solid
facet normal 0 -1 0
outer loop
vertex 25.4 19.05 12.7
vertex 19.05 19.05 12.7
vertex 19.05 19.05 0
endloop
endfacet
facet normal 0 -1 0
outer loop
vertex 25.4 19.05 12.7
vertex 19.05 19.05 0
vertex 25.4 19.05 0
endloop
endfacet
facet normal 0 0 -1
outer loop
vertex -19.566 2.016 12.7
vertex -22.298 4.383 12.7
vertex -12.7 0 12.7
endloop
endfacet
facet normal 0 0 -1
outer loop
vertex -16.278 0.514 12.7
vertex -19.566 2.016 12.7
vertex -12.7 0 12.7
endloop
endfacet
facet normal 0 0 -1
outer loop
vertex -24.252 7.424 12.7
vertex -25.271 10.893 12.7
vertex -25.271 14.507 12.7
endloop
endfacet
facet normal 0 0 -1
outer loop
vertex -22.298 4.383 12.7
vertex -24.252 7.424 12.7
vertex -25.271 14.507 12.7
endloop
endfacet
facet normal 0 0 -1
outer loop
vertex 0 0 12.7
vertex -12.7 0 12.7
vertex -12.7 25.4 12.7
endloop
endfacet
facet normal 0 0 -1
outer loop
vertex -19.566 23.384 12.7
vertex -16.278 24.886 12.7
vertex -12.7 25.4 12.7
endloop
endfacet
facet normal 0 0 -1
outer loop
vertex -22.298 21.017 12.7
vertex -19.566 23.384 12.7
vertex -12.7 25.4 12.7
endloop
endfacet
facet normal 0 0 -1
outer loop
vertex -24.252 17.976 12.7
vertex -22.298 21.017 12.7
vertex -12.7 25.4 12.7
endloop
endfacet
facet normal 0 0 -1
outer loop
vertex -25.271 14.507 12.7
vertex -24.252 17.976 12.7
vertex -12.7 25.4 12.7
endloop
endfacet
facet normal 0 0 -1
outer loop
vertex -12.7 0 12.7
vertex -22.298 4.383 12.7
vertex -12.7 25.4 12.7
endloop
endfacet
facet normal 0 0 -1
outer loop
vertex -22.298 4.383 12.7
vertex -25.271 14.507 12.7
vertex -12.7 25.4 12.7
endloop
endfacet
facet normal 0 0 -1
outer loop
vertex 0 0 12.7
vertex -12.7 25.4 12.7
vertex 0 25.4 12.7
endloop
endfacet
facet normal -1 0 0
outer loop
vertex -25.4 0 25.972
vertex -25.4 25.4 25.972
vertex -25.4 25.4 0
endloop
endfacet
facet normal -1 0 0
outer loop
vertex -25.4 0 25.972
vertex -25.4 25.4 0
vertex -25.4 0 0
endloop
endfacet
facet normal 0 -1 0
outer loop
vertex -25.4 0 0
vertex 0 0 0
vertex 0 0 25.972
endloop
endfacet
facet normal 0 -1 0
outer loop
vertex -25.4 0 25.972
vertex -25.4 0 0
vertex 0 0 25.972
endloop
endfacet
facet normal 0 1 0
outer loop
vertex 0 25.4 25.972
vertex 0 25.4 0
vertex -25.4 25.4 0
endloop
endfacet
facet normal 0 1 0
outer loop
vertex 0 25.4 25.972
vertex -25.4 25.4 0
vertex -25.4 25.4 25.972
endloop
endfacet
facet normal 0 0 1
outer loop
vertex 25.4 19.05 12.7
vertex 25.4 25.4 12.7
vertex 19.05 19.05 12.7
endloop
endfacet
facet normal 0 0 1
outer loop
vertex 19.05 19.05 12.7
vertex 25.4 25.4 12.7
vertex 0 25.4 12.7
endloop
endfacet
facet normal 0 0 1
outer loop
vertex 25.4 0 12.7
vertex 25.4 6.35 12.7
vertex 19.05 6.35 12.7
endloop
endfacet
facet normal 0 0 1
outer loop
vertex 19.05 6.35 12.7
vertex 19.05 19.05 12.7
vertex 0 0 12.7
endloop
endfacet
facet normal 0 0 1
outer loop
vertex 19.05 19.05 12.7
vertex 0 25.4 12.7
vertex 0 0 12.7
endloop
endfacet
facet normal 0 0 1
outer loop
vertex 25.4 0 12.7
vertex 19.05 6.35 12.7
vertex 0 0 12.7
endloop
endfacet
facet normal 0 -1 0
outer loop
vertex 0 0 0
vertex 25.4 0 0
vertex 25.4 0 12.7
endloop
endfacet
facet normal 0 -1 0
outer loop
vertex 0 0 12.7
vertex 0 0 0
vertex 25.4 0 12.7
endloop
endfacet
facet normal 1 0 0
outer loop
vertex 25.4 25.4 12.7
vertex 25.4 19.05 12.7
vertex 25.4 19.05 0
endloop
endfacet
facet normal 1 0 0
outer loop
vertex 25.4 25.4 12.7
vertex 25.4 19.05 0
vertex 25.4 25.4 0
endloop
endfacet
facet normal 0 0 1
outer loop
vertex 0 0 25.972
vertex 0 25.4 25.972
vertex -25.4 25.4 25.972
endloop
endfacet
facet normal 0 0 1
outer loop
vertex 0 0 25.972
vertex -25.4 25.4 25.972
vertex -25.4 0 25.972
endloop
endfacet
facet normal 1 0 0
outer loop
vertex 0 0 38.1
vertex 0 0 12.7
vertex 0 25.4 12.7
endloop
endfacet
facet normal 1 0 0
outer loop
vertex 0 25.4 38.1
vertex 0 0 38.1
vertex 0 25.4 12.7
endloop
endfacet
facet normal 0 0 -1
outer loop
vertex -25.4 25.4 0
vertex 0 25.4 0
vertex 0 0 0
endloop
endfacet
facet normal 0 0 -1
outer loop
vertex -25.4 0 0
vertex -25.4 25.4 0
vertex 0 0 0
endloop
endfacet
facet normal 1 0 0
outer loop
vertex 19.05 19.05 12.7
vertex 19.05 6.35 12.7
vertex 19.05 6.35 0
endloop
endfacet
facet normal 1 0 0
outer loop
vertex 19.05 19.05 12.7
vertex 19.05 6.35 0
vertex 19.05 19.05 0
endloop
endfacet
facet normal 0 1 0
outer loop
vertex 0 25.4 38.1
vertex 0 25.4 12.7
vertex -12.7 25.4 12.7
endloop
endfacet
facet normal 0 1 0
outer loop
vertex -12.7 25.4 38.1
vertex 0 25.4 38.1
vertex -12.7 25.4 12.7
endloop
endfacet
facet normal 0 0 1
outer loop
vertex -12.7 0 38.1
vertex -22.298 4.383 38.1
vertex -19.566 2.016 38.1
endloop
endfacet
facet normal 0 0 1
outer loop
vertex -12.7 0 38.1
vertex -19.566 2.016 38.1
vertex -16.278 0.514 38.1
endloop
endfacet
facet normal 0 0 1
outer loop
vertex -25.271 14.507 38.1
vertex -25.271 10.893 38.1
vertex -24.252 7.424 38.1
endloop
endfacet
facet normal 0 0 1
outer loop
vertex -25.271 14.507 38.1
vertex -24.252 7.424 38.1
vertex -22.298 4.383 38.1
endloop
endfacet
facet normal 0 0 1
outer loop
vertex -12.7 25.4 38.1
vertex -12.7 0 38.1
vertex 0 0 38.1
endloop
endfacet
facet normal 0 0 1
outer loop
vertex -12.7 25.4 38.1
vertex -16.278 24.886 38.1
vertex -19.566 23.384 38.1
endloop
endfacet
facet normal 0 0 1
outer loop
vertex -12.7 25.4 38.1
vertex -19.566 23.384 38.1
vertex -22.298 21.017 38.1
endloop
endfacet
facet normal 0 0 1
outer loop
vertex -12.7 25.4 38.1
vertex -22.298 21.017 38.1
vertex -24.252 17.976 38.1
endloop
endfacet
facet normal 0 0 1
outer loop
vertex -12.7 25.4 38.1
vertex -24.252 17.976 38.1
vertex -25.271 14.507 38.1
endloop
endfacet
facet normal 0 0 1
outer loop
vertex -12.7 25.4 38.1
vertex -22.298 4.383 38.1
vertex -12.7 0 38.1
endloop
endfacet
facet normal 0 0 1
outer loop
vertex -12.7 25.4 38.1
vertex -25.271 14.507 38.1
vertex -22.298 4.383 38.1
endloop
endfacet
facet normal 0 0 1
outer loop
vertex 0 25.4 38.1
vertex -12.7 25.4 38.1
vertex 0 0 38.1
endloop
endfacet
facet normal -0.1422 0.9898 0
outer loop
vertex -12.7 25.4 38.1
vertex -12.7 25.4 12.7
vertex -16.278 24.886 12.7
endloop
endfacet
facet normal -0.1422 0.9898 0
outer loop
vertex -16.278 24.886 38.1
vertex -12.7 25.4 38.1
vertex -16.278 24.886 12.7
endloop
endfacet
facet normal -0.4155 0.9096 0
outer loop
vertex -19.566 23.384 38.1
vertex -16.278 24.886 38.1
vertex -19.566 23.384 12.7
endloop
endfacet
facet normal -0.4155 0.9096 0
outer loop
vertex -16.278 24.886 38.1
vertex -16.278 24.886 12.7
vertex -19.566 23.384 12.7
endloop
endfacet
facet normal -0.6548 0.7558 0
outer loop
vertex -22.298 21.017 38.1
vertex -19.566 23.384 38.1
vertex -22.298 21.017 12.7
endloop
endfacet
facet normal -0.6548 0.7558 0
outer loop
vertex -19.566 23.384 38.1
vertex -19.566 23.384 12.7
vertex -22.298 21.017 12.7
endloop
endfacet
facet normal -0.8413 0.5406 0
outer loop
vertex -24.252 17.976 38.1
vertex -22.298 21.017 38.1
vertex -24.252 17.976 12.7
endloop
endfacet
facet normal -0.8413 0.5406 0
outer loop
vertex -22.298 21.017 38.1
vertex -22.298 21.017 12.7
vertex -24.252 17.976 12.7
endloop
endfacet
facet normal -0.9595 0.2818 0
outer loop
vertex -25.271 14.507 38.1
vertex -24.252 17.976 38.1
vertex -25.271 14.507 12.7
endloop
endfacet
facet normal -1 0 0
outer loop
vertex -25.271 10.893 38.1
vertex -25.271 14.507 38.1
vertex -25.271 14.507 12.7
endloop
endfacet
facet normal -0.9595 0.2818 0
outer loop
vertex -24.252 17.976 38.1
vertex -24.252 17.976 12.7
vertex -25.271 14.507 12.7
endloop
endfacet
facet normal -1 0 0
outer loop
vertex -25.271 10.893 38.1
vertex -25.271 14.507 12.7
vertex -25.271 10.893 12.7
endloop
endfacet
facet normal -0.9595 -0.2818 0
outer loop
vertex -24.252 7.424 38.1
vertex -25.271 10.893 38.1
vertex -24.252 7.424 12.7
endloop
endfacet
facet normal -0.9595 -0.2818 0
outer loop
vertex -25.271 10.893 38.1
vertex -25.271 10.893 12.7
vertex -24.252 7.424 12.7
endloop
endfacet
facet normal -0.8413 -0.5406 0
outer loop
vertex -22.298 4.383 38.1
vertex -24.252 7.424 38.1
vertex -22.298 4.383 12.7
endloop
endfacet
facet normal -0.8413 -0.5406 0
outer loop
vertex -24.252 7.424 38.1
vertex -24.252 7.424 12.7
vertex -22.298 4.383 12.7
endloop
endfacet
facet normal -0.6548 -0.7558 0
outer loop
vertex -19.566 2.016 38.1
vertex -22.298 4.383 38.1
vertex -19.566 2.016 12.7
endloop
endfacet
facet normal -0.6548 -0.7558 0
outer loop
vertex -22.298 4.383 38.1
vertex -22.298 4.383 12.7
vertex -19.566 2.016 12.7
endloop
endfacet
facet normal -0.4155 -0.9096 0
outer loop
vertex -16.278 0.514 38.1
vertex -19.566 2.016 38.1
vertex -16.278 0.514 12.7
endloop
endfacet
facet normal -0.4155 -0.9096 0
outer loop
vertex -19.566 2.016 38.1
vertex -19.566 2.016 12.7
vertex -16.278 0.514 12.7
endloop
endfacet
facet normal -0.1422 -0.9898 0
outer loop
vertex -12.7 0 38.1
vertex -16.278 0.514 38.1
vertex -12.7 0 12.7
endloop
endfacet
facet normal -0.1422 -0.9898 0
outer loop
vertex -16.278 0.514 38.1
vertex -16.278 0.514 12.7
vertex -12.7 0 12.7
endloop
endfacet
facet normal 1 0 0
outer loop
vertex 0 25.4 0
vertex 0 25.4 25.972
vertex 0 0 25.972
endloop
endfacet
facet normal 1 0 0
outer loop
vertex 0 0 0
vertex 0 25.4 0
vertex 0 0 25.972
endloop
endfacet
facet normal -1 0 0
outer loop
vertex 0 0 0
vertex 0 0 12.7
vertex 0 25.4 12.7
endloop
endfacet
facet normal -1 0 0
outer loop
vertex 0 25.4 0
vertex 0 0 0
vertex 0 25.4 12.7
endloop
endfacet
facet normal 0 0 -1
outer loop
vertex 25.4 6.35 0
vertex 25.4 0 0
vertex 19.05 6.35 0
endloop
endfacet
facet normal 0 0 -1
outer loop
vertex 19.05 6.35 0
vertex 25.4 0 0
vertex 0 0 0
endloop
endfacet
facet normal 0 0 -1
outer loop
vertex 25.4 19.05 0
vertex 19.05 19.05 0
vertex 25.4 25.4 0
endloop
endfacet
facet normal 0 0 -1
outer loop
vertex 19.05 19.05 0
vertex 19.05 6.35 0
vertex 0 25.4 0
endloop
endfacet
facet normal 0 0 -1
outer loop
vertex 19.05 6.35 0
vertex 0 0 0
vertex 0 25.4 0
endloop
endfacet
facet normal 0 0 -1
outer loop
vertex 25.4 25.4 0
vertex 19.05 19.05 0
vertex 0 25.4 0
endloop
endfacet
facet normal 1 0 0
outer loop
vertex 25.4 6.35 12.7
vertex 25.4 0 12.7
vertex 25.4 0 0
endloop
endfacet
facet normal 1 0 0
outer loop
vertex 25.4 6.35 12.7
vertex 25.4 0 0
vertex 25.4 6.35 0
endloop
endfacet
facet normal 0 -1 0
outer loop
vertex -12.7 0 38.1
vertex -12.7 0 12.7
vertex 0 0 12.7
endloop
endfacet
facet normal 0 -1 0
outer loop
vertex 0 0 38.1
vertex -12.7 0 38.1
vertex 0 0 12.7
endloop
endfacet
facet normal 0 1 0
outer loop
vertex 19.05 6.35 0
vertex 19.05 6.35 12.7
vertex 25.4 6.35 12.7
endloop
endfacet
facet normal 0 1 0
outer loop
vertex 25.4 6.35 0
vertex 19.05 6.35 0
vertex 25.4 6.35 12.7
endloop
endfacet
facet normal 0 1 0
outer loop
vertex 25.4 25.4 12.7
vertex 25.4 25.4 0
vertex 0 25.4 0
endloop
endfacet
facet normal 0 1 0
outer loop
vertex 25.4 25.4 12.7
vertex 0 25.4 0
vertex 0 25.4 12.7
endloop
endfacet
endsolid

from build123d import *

# Parameters (mm, degrees)
F0_W     = 6.35
F0_H     = 12.7
F0_W_2   = 12.7
F1_DEPTH = 25.4
F2_W     = 6.35
F2_H     = 12.7
F3_DEPTH = 12.701
F5_DEPTH = 25.4
F6_W     = 25.4
F6_H     = 25.971629
F7_DEPTH = 25.4


with BuildPart() as f1:
    # F0 (on Right) → F1 (new body)
    with BuildSketch(Plane.YZ):
        with Locations((3.175, 6.35)):
            Rectangle(F0_W, F0_H)
        with Locations((12.7, 6.35)):
            Rectangle(F0_W_2, F0_H)
        with Locations((22.225, 6.35)):
            Rectangle(F0_W, F0_H)
    extrude(amount=F1_DEPTH)

    # F2 (on face) → F3 (cut, through all)
    with BuildSketch(Plane.XY.offset(12.7)):
        with Locations((22.225, 12.7)):
            Rectangle(F2_W, F2_H)
    extrude(amount=-F3_DEPTH, mode=Mode.SUBTRACT)


with BuildPart() as f5:
    # F4 (on face) → F5 (new body)
    with BuildSketch(Plane.XY.offset(12.7)):
        with BuildLine():
            Line((-12.7, 0), (0, 0))
            Line((0, 0), (0, 25.4))
            Line((0, 25.4), (-12.7, 25.4))
            ThreePointArc((-12.7, 25.4), (-25.4, 12.7), (-12.7, 0))
        make_face()
    extrude(amount=F5_DEPTH)


with BuildPart() as f7:
    # F6 (on face) → F7 (new body)
    with BuildSketch(Plane(origin=(0, 0, 0), x_dir=(0, -1, 0), z_dir=(-1, 0, 0))):
        with Locations((-12.7, 12.985815)):
            Rectangle(F6_W, F6_H)
    extrude(amount=F7_DEPTH)


solid = Compound([f1.part, f5.part, f7.part])
